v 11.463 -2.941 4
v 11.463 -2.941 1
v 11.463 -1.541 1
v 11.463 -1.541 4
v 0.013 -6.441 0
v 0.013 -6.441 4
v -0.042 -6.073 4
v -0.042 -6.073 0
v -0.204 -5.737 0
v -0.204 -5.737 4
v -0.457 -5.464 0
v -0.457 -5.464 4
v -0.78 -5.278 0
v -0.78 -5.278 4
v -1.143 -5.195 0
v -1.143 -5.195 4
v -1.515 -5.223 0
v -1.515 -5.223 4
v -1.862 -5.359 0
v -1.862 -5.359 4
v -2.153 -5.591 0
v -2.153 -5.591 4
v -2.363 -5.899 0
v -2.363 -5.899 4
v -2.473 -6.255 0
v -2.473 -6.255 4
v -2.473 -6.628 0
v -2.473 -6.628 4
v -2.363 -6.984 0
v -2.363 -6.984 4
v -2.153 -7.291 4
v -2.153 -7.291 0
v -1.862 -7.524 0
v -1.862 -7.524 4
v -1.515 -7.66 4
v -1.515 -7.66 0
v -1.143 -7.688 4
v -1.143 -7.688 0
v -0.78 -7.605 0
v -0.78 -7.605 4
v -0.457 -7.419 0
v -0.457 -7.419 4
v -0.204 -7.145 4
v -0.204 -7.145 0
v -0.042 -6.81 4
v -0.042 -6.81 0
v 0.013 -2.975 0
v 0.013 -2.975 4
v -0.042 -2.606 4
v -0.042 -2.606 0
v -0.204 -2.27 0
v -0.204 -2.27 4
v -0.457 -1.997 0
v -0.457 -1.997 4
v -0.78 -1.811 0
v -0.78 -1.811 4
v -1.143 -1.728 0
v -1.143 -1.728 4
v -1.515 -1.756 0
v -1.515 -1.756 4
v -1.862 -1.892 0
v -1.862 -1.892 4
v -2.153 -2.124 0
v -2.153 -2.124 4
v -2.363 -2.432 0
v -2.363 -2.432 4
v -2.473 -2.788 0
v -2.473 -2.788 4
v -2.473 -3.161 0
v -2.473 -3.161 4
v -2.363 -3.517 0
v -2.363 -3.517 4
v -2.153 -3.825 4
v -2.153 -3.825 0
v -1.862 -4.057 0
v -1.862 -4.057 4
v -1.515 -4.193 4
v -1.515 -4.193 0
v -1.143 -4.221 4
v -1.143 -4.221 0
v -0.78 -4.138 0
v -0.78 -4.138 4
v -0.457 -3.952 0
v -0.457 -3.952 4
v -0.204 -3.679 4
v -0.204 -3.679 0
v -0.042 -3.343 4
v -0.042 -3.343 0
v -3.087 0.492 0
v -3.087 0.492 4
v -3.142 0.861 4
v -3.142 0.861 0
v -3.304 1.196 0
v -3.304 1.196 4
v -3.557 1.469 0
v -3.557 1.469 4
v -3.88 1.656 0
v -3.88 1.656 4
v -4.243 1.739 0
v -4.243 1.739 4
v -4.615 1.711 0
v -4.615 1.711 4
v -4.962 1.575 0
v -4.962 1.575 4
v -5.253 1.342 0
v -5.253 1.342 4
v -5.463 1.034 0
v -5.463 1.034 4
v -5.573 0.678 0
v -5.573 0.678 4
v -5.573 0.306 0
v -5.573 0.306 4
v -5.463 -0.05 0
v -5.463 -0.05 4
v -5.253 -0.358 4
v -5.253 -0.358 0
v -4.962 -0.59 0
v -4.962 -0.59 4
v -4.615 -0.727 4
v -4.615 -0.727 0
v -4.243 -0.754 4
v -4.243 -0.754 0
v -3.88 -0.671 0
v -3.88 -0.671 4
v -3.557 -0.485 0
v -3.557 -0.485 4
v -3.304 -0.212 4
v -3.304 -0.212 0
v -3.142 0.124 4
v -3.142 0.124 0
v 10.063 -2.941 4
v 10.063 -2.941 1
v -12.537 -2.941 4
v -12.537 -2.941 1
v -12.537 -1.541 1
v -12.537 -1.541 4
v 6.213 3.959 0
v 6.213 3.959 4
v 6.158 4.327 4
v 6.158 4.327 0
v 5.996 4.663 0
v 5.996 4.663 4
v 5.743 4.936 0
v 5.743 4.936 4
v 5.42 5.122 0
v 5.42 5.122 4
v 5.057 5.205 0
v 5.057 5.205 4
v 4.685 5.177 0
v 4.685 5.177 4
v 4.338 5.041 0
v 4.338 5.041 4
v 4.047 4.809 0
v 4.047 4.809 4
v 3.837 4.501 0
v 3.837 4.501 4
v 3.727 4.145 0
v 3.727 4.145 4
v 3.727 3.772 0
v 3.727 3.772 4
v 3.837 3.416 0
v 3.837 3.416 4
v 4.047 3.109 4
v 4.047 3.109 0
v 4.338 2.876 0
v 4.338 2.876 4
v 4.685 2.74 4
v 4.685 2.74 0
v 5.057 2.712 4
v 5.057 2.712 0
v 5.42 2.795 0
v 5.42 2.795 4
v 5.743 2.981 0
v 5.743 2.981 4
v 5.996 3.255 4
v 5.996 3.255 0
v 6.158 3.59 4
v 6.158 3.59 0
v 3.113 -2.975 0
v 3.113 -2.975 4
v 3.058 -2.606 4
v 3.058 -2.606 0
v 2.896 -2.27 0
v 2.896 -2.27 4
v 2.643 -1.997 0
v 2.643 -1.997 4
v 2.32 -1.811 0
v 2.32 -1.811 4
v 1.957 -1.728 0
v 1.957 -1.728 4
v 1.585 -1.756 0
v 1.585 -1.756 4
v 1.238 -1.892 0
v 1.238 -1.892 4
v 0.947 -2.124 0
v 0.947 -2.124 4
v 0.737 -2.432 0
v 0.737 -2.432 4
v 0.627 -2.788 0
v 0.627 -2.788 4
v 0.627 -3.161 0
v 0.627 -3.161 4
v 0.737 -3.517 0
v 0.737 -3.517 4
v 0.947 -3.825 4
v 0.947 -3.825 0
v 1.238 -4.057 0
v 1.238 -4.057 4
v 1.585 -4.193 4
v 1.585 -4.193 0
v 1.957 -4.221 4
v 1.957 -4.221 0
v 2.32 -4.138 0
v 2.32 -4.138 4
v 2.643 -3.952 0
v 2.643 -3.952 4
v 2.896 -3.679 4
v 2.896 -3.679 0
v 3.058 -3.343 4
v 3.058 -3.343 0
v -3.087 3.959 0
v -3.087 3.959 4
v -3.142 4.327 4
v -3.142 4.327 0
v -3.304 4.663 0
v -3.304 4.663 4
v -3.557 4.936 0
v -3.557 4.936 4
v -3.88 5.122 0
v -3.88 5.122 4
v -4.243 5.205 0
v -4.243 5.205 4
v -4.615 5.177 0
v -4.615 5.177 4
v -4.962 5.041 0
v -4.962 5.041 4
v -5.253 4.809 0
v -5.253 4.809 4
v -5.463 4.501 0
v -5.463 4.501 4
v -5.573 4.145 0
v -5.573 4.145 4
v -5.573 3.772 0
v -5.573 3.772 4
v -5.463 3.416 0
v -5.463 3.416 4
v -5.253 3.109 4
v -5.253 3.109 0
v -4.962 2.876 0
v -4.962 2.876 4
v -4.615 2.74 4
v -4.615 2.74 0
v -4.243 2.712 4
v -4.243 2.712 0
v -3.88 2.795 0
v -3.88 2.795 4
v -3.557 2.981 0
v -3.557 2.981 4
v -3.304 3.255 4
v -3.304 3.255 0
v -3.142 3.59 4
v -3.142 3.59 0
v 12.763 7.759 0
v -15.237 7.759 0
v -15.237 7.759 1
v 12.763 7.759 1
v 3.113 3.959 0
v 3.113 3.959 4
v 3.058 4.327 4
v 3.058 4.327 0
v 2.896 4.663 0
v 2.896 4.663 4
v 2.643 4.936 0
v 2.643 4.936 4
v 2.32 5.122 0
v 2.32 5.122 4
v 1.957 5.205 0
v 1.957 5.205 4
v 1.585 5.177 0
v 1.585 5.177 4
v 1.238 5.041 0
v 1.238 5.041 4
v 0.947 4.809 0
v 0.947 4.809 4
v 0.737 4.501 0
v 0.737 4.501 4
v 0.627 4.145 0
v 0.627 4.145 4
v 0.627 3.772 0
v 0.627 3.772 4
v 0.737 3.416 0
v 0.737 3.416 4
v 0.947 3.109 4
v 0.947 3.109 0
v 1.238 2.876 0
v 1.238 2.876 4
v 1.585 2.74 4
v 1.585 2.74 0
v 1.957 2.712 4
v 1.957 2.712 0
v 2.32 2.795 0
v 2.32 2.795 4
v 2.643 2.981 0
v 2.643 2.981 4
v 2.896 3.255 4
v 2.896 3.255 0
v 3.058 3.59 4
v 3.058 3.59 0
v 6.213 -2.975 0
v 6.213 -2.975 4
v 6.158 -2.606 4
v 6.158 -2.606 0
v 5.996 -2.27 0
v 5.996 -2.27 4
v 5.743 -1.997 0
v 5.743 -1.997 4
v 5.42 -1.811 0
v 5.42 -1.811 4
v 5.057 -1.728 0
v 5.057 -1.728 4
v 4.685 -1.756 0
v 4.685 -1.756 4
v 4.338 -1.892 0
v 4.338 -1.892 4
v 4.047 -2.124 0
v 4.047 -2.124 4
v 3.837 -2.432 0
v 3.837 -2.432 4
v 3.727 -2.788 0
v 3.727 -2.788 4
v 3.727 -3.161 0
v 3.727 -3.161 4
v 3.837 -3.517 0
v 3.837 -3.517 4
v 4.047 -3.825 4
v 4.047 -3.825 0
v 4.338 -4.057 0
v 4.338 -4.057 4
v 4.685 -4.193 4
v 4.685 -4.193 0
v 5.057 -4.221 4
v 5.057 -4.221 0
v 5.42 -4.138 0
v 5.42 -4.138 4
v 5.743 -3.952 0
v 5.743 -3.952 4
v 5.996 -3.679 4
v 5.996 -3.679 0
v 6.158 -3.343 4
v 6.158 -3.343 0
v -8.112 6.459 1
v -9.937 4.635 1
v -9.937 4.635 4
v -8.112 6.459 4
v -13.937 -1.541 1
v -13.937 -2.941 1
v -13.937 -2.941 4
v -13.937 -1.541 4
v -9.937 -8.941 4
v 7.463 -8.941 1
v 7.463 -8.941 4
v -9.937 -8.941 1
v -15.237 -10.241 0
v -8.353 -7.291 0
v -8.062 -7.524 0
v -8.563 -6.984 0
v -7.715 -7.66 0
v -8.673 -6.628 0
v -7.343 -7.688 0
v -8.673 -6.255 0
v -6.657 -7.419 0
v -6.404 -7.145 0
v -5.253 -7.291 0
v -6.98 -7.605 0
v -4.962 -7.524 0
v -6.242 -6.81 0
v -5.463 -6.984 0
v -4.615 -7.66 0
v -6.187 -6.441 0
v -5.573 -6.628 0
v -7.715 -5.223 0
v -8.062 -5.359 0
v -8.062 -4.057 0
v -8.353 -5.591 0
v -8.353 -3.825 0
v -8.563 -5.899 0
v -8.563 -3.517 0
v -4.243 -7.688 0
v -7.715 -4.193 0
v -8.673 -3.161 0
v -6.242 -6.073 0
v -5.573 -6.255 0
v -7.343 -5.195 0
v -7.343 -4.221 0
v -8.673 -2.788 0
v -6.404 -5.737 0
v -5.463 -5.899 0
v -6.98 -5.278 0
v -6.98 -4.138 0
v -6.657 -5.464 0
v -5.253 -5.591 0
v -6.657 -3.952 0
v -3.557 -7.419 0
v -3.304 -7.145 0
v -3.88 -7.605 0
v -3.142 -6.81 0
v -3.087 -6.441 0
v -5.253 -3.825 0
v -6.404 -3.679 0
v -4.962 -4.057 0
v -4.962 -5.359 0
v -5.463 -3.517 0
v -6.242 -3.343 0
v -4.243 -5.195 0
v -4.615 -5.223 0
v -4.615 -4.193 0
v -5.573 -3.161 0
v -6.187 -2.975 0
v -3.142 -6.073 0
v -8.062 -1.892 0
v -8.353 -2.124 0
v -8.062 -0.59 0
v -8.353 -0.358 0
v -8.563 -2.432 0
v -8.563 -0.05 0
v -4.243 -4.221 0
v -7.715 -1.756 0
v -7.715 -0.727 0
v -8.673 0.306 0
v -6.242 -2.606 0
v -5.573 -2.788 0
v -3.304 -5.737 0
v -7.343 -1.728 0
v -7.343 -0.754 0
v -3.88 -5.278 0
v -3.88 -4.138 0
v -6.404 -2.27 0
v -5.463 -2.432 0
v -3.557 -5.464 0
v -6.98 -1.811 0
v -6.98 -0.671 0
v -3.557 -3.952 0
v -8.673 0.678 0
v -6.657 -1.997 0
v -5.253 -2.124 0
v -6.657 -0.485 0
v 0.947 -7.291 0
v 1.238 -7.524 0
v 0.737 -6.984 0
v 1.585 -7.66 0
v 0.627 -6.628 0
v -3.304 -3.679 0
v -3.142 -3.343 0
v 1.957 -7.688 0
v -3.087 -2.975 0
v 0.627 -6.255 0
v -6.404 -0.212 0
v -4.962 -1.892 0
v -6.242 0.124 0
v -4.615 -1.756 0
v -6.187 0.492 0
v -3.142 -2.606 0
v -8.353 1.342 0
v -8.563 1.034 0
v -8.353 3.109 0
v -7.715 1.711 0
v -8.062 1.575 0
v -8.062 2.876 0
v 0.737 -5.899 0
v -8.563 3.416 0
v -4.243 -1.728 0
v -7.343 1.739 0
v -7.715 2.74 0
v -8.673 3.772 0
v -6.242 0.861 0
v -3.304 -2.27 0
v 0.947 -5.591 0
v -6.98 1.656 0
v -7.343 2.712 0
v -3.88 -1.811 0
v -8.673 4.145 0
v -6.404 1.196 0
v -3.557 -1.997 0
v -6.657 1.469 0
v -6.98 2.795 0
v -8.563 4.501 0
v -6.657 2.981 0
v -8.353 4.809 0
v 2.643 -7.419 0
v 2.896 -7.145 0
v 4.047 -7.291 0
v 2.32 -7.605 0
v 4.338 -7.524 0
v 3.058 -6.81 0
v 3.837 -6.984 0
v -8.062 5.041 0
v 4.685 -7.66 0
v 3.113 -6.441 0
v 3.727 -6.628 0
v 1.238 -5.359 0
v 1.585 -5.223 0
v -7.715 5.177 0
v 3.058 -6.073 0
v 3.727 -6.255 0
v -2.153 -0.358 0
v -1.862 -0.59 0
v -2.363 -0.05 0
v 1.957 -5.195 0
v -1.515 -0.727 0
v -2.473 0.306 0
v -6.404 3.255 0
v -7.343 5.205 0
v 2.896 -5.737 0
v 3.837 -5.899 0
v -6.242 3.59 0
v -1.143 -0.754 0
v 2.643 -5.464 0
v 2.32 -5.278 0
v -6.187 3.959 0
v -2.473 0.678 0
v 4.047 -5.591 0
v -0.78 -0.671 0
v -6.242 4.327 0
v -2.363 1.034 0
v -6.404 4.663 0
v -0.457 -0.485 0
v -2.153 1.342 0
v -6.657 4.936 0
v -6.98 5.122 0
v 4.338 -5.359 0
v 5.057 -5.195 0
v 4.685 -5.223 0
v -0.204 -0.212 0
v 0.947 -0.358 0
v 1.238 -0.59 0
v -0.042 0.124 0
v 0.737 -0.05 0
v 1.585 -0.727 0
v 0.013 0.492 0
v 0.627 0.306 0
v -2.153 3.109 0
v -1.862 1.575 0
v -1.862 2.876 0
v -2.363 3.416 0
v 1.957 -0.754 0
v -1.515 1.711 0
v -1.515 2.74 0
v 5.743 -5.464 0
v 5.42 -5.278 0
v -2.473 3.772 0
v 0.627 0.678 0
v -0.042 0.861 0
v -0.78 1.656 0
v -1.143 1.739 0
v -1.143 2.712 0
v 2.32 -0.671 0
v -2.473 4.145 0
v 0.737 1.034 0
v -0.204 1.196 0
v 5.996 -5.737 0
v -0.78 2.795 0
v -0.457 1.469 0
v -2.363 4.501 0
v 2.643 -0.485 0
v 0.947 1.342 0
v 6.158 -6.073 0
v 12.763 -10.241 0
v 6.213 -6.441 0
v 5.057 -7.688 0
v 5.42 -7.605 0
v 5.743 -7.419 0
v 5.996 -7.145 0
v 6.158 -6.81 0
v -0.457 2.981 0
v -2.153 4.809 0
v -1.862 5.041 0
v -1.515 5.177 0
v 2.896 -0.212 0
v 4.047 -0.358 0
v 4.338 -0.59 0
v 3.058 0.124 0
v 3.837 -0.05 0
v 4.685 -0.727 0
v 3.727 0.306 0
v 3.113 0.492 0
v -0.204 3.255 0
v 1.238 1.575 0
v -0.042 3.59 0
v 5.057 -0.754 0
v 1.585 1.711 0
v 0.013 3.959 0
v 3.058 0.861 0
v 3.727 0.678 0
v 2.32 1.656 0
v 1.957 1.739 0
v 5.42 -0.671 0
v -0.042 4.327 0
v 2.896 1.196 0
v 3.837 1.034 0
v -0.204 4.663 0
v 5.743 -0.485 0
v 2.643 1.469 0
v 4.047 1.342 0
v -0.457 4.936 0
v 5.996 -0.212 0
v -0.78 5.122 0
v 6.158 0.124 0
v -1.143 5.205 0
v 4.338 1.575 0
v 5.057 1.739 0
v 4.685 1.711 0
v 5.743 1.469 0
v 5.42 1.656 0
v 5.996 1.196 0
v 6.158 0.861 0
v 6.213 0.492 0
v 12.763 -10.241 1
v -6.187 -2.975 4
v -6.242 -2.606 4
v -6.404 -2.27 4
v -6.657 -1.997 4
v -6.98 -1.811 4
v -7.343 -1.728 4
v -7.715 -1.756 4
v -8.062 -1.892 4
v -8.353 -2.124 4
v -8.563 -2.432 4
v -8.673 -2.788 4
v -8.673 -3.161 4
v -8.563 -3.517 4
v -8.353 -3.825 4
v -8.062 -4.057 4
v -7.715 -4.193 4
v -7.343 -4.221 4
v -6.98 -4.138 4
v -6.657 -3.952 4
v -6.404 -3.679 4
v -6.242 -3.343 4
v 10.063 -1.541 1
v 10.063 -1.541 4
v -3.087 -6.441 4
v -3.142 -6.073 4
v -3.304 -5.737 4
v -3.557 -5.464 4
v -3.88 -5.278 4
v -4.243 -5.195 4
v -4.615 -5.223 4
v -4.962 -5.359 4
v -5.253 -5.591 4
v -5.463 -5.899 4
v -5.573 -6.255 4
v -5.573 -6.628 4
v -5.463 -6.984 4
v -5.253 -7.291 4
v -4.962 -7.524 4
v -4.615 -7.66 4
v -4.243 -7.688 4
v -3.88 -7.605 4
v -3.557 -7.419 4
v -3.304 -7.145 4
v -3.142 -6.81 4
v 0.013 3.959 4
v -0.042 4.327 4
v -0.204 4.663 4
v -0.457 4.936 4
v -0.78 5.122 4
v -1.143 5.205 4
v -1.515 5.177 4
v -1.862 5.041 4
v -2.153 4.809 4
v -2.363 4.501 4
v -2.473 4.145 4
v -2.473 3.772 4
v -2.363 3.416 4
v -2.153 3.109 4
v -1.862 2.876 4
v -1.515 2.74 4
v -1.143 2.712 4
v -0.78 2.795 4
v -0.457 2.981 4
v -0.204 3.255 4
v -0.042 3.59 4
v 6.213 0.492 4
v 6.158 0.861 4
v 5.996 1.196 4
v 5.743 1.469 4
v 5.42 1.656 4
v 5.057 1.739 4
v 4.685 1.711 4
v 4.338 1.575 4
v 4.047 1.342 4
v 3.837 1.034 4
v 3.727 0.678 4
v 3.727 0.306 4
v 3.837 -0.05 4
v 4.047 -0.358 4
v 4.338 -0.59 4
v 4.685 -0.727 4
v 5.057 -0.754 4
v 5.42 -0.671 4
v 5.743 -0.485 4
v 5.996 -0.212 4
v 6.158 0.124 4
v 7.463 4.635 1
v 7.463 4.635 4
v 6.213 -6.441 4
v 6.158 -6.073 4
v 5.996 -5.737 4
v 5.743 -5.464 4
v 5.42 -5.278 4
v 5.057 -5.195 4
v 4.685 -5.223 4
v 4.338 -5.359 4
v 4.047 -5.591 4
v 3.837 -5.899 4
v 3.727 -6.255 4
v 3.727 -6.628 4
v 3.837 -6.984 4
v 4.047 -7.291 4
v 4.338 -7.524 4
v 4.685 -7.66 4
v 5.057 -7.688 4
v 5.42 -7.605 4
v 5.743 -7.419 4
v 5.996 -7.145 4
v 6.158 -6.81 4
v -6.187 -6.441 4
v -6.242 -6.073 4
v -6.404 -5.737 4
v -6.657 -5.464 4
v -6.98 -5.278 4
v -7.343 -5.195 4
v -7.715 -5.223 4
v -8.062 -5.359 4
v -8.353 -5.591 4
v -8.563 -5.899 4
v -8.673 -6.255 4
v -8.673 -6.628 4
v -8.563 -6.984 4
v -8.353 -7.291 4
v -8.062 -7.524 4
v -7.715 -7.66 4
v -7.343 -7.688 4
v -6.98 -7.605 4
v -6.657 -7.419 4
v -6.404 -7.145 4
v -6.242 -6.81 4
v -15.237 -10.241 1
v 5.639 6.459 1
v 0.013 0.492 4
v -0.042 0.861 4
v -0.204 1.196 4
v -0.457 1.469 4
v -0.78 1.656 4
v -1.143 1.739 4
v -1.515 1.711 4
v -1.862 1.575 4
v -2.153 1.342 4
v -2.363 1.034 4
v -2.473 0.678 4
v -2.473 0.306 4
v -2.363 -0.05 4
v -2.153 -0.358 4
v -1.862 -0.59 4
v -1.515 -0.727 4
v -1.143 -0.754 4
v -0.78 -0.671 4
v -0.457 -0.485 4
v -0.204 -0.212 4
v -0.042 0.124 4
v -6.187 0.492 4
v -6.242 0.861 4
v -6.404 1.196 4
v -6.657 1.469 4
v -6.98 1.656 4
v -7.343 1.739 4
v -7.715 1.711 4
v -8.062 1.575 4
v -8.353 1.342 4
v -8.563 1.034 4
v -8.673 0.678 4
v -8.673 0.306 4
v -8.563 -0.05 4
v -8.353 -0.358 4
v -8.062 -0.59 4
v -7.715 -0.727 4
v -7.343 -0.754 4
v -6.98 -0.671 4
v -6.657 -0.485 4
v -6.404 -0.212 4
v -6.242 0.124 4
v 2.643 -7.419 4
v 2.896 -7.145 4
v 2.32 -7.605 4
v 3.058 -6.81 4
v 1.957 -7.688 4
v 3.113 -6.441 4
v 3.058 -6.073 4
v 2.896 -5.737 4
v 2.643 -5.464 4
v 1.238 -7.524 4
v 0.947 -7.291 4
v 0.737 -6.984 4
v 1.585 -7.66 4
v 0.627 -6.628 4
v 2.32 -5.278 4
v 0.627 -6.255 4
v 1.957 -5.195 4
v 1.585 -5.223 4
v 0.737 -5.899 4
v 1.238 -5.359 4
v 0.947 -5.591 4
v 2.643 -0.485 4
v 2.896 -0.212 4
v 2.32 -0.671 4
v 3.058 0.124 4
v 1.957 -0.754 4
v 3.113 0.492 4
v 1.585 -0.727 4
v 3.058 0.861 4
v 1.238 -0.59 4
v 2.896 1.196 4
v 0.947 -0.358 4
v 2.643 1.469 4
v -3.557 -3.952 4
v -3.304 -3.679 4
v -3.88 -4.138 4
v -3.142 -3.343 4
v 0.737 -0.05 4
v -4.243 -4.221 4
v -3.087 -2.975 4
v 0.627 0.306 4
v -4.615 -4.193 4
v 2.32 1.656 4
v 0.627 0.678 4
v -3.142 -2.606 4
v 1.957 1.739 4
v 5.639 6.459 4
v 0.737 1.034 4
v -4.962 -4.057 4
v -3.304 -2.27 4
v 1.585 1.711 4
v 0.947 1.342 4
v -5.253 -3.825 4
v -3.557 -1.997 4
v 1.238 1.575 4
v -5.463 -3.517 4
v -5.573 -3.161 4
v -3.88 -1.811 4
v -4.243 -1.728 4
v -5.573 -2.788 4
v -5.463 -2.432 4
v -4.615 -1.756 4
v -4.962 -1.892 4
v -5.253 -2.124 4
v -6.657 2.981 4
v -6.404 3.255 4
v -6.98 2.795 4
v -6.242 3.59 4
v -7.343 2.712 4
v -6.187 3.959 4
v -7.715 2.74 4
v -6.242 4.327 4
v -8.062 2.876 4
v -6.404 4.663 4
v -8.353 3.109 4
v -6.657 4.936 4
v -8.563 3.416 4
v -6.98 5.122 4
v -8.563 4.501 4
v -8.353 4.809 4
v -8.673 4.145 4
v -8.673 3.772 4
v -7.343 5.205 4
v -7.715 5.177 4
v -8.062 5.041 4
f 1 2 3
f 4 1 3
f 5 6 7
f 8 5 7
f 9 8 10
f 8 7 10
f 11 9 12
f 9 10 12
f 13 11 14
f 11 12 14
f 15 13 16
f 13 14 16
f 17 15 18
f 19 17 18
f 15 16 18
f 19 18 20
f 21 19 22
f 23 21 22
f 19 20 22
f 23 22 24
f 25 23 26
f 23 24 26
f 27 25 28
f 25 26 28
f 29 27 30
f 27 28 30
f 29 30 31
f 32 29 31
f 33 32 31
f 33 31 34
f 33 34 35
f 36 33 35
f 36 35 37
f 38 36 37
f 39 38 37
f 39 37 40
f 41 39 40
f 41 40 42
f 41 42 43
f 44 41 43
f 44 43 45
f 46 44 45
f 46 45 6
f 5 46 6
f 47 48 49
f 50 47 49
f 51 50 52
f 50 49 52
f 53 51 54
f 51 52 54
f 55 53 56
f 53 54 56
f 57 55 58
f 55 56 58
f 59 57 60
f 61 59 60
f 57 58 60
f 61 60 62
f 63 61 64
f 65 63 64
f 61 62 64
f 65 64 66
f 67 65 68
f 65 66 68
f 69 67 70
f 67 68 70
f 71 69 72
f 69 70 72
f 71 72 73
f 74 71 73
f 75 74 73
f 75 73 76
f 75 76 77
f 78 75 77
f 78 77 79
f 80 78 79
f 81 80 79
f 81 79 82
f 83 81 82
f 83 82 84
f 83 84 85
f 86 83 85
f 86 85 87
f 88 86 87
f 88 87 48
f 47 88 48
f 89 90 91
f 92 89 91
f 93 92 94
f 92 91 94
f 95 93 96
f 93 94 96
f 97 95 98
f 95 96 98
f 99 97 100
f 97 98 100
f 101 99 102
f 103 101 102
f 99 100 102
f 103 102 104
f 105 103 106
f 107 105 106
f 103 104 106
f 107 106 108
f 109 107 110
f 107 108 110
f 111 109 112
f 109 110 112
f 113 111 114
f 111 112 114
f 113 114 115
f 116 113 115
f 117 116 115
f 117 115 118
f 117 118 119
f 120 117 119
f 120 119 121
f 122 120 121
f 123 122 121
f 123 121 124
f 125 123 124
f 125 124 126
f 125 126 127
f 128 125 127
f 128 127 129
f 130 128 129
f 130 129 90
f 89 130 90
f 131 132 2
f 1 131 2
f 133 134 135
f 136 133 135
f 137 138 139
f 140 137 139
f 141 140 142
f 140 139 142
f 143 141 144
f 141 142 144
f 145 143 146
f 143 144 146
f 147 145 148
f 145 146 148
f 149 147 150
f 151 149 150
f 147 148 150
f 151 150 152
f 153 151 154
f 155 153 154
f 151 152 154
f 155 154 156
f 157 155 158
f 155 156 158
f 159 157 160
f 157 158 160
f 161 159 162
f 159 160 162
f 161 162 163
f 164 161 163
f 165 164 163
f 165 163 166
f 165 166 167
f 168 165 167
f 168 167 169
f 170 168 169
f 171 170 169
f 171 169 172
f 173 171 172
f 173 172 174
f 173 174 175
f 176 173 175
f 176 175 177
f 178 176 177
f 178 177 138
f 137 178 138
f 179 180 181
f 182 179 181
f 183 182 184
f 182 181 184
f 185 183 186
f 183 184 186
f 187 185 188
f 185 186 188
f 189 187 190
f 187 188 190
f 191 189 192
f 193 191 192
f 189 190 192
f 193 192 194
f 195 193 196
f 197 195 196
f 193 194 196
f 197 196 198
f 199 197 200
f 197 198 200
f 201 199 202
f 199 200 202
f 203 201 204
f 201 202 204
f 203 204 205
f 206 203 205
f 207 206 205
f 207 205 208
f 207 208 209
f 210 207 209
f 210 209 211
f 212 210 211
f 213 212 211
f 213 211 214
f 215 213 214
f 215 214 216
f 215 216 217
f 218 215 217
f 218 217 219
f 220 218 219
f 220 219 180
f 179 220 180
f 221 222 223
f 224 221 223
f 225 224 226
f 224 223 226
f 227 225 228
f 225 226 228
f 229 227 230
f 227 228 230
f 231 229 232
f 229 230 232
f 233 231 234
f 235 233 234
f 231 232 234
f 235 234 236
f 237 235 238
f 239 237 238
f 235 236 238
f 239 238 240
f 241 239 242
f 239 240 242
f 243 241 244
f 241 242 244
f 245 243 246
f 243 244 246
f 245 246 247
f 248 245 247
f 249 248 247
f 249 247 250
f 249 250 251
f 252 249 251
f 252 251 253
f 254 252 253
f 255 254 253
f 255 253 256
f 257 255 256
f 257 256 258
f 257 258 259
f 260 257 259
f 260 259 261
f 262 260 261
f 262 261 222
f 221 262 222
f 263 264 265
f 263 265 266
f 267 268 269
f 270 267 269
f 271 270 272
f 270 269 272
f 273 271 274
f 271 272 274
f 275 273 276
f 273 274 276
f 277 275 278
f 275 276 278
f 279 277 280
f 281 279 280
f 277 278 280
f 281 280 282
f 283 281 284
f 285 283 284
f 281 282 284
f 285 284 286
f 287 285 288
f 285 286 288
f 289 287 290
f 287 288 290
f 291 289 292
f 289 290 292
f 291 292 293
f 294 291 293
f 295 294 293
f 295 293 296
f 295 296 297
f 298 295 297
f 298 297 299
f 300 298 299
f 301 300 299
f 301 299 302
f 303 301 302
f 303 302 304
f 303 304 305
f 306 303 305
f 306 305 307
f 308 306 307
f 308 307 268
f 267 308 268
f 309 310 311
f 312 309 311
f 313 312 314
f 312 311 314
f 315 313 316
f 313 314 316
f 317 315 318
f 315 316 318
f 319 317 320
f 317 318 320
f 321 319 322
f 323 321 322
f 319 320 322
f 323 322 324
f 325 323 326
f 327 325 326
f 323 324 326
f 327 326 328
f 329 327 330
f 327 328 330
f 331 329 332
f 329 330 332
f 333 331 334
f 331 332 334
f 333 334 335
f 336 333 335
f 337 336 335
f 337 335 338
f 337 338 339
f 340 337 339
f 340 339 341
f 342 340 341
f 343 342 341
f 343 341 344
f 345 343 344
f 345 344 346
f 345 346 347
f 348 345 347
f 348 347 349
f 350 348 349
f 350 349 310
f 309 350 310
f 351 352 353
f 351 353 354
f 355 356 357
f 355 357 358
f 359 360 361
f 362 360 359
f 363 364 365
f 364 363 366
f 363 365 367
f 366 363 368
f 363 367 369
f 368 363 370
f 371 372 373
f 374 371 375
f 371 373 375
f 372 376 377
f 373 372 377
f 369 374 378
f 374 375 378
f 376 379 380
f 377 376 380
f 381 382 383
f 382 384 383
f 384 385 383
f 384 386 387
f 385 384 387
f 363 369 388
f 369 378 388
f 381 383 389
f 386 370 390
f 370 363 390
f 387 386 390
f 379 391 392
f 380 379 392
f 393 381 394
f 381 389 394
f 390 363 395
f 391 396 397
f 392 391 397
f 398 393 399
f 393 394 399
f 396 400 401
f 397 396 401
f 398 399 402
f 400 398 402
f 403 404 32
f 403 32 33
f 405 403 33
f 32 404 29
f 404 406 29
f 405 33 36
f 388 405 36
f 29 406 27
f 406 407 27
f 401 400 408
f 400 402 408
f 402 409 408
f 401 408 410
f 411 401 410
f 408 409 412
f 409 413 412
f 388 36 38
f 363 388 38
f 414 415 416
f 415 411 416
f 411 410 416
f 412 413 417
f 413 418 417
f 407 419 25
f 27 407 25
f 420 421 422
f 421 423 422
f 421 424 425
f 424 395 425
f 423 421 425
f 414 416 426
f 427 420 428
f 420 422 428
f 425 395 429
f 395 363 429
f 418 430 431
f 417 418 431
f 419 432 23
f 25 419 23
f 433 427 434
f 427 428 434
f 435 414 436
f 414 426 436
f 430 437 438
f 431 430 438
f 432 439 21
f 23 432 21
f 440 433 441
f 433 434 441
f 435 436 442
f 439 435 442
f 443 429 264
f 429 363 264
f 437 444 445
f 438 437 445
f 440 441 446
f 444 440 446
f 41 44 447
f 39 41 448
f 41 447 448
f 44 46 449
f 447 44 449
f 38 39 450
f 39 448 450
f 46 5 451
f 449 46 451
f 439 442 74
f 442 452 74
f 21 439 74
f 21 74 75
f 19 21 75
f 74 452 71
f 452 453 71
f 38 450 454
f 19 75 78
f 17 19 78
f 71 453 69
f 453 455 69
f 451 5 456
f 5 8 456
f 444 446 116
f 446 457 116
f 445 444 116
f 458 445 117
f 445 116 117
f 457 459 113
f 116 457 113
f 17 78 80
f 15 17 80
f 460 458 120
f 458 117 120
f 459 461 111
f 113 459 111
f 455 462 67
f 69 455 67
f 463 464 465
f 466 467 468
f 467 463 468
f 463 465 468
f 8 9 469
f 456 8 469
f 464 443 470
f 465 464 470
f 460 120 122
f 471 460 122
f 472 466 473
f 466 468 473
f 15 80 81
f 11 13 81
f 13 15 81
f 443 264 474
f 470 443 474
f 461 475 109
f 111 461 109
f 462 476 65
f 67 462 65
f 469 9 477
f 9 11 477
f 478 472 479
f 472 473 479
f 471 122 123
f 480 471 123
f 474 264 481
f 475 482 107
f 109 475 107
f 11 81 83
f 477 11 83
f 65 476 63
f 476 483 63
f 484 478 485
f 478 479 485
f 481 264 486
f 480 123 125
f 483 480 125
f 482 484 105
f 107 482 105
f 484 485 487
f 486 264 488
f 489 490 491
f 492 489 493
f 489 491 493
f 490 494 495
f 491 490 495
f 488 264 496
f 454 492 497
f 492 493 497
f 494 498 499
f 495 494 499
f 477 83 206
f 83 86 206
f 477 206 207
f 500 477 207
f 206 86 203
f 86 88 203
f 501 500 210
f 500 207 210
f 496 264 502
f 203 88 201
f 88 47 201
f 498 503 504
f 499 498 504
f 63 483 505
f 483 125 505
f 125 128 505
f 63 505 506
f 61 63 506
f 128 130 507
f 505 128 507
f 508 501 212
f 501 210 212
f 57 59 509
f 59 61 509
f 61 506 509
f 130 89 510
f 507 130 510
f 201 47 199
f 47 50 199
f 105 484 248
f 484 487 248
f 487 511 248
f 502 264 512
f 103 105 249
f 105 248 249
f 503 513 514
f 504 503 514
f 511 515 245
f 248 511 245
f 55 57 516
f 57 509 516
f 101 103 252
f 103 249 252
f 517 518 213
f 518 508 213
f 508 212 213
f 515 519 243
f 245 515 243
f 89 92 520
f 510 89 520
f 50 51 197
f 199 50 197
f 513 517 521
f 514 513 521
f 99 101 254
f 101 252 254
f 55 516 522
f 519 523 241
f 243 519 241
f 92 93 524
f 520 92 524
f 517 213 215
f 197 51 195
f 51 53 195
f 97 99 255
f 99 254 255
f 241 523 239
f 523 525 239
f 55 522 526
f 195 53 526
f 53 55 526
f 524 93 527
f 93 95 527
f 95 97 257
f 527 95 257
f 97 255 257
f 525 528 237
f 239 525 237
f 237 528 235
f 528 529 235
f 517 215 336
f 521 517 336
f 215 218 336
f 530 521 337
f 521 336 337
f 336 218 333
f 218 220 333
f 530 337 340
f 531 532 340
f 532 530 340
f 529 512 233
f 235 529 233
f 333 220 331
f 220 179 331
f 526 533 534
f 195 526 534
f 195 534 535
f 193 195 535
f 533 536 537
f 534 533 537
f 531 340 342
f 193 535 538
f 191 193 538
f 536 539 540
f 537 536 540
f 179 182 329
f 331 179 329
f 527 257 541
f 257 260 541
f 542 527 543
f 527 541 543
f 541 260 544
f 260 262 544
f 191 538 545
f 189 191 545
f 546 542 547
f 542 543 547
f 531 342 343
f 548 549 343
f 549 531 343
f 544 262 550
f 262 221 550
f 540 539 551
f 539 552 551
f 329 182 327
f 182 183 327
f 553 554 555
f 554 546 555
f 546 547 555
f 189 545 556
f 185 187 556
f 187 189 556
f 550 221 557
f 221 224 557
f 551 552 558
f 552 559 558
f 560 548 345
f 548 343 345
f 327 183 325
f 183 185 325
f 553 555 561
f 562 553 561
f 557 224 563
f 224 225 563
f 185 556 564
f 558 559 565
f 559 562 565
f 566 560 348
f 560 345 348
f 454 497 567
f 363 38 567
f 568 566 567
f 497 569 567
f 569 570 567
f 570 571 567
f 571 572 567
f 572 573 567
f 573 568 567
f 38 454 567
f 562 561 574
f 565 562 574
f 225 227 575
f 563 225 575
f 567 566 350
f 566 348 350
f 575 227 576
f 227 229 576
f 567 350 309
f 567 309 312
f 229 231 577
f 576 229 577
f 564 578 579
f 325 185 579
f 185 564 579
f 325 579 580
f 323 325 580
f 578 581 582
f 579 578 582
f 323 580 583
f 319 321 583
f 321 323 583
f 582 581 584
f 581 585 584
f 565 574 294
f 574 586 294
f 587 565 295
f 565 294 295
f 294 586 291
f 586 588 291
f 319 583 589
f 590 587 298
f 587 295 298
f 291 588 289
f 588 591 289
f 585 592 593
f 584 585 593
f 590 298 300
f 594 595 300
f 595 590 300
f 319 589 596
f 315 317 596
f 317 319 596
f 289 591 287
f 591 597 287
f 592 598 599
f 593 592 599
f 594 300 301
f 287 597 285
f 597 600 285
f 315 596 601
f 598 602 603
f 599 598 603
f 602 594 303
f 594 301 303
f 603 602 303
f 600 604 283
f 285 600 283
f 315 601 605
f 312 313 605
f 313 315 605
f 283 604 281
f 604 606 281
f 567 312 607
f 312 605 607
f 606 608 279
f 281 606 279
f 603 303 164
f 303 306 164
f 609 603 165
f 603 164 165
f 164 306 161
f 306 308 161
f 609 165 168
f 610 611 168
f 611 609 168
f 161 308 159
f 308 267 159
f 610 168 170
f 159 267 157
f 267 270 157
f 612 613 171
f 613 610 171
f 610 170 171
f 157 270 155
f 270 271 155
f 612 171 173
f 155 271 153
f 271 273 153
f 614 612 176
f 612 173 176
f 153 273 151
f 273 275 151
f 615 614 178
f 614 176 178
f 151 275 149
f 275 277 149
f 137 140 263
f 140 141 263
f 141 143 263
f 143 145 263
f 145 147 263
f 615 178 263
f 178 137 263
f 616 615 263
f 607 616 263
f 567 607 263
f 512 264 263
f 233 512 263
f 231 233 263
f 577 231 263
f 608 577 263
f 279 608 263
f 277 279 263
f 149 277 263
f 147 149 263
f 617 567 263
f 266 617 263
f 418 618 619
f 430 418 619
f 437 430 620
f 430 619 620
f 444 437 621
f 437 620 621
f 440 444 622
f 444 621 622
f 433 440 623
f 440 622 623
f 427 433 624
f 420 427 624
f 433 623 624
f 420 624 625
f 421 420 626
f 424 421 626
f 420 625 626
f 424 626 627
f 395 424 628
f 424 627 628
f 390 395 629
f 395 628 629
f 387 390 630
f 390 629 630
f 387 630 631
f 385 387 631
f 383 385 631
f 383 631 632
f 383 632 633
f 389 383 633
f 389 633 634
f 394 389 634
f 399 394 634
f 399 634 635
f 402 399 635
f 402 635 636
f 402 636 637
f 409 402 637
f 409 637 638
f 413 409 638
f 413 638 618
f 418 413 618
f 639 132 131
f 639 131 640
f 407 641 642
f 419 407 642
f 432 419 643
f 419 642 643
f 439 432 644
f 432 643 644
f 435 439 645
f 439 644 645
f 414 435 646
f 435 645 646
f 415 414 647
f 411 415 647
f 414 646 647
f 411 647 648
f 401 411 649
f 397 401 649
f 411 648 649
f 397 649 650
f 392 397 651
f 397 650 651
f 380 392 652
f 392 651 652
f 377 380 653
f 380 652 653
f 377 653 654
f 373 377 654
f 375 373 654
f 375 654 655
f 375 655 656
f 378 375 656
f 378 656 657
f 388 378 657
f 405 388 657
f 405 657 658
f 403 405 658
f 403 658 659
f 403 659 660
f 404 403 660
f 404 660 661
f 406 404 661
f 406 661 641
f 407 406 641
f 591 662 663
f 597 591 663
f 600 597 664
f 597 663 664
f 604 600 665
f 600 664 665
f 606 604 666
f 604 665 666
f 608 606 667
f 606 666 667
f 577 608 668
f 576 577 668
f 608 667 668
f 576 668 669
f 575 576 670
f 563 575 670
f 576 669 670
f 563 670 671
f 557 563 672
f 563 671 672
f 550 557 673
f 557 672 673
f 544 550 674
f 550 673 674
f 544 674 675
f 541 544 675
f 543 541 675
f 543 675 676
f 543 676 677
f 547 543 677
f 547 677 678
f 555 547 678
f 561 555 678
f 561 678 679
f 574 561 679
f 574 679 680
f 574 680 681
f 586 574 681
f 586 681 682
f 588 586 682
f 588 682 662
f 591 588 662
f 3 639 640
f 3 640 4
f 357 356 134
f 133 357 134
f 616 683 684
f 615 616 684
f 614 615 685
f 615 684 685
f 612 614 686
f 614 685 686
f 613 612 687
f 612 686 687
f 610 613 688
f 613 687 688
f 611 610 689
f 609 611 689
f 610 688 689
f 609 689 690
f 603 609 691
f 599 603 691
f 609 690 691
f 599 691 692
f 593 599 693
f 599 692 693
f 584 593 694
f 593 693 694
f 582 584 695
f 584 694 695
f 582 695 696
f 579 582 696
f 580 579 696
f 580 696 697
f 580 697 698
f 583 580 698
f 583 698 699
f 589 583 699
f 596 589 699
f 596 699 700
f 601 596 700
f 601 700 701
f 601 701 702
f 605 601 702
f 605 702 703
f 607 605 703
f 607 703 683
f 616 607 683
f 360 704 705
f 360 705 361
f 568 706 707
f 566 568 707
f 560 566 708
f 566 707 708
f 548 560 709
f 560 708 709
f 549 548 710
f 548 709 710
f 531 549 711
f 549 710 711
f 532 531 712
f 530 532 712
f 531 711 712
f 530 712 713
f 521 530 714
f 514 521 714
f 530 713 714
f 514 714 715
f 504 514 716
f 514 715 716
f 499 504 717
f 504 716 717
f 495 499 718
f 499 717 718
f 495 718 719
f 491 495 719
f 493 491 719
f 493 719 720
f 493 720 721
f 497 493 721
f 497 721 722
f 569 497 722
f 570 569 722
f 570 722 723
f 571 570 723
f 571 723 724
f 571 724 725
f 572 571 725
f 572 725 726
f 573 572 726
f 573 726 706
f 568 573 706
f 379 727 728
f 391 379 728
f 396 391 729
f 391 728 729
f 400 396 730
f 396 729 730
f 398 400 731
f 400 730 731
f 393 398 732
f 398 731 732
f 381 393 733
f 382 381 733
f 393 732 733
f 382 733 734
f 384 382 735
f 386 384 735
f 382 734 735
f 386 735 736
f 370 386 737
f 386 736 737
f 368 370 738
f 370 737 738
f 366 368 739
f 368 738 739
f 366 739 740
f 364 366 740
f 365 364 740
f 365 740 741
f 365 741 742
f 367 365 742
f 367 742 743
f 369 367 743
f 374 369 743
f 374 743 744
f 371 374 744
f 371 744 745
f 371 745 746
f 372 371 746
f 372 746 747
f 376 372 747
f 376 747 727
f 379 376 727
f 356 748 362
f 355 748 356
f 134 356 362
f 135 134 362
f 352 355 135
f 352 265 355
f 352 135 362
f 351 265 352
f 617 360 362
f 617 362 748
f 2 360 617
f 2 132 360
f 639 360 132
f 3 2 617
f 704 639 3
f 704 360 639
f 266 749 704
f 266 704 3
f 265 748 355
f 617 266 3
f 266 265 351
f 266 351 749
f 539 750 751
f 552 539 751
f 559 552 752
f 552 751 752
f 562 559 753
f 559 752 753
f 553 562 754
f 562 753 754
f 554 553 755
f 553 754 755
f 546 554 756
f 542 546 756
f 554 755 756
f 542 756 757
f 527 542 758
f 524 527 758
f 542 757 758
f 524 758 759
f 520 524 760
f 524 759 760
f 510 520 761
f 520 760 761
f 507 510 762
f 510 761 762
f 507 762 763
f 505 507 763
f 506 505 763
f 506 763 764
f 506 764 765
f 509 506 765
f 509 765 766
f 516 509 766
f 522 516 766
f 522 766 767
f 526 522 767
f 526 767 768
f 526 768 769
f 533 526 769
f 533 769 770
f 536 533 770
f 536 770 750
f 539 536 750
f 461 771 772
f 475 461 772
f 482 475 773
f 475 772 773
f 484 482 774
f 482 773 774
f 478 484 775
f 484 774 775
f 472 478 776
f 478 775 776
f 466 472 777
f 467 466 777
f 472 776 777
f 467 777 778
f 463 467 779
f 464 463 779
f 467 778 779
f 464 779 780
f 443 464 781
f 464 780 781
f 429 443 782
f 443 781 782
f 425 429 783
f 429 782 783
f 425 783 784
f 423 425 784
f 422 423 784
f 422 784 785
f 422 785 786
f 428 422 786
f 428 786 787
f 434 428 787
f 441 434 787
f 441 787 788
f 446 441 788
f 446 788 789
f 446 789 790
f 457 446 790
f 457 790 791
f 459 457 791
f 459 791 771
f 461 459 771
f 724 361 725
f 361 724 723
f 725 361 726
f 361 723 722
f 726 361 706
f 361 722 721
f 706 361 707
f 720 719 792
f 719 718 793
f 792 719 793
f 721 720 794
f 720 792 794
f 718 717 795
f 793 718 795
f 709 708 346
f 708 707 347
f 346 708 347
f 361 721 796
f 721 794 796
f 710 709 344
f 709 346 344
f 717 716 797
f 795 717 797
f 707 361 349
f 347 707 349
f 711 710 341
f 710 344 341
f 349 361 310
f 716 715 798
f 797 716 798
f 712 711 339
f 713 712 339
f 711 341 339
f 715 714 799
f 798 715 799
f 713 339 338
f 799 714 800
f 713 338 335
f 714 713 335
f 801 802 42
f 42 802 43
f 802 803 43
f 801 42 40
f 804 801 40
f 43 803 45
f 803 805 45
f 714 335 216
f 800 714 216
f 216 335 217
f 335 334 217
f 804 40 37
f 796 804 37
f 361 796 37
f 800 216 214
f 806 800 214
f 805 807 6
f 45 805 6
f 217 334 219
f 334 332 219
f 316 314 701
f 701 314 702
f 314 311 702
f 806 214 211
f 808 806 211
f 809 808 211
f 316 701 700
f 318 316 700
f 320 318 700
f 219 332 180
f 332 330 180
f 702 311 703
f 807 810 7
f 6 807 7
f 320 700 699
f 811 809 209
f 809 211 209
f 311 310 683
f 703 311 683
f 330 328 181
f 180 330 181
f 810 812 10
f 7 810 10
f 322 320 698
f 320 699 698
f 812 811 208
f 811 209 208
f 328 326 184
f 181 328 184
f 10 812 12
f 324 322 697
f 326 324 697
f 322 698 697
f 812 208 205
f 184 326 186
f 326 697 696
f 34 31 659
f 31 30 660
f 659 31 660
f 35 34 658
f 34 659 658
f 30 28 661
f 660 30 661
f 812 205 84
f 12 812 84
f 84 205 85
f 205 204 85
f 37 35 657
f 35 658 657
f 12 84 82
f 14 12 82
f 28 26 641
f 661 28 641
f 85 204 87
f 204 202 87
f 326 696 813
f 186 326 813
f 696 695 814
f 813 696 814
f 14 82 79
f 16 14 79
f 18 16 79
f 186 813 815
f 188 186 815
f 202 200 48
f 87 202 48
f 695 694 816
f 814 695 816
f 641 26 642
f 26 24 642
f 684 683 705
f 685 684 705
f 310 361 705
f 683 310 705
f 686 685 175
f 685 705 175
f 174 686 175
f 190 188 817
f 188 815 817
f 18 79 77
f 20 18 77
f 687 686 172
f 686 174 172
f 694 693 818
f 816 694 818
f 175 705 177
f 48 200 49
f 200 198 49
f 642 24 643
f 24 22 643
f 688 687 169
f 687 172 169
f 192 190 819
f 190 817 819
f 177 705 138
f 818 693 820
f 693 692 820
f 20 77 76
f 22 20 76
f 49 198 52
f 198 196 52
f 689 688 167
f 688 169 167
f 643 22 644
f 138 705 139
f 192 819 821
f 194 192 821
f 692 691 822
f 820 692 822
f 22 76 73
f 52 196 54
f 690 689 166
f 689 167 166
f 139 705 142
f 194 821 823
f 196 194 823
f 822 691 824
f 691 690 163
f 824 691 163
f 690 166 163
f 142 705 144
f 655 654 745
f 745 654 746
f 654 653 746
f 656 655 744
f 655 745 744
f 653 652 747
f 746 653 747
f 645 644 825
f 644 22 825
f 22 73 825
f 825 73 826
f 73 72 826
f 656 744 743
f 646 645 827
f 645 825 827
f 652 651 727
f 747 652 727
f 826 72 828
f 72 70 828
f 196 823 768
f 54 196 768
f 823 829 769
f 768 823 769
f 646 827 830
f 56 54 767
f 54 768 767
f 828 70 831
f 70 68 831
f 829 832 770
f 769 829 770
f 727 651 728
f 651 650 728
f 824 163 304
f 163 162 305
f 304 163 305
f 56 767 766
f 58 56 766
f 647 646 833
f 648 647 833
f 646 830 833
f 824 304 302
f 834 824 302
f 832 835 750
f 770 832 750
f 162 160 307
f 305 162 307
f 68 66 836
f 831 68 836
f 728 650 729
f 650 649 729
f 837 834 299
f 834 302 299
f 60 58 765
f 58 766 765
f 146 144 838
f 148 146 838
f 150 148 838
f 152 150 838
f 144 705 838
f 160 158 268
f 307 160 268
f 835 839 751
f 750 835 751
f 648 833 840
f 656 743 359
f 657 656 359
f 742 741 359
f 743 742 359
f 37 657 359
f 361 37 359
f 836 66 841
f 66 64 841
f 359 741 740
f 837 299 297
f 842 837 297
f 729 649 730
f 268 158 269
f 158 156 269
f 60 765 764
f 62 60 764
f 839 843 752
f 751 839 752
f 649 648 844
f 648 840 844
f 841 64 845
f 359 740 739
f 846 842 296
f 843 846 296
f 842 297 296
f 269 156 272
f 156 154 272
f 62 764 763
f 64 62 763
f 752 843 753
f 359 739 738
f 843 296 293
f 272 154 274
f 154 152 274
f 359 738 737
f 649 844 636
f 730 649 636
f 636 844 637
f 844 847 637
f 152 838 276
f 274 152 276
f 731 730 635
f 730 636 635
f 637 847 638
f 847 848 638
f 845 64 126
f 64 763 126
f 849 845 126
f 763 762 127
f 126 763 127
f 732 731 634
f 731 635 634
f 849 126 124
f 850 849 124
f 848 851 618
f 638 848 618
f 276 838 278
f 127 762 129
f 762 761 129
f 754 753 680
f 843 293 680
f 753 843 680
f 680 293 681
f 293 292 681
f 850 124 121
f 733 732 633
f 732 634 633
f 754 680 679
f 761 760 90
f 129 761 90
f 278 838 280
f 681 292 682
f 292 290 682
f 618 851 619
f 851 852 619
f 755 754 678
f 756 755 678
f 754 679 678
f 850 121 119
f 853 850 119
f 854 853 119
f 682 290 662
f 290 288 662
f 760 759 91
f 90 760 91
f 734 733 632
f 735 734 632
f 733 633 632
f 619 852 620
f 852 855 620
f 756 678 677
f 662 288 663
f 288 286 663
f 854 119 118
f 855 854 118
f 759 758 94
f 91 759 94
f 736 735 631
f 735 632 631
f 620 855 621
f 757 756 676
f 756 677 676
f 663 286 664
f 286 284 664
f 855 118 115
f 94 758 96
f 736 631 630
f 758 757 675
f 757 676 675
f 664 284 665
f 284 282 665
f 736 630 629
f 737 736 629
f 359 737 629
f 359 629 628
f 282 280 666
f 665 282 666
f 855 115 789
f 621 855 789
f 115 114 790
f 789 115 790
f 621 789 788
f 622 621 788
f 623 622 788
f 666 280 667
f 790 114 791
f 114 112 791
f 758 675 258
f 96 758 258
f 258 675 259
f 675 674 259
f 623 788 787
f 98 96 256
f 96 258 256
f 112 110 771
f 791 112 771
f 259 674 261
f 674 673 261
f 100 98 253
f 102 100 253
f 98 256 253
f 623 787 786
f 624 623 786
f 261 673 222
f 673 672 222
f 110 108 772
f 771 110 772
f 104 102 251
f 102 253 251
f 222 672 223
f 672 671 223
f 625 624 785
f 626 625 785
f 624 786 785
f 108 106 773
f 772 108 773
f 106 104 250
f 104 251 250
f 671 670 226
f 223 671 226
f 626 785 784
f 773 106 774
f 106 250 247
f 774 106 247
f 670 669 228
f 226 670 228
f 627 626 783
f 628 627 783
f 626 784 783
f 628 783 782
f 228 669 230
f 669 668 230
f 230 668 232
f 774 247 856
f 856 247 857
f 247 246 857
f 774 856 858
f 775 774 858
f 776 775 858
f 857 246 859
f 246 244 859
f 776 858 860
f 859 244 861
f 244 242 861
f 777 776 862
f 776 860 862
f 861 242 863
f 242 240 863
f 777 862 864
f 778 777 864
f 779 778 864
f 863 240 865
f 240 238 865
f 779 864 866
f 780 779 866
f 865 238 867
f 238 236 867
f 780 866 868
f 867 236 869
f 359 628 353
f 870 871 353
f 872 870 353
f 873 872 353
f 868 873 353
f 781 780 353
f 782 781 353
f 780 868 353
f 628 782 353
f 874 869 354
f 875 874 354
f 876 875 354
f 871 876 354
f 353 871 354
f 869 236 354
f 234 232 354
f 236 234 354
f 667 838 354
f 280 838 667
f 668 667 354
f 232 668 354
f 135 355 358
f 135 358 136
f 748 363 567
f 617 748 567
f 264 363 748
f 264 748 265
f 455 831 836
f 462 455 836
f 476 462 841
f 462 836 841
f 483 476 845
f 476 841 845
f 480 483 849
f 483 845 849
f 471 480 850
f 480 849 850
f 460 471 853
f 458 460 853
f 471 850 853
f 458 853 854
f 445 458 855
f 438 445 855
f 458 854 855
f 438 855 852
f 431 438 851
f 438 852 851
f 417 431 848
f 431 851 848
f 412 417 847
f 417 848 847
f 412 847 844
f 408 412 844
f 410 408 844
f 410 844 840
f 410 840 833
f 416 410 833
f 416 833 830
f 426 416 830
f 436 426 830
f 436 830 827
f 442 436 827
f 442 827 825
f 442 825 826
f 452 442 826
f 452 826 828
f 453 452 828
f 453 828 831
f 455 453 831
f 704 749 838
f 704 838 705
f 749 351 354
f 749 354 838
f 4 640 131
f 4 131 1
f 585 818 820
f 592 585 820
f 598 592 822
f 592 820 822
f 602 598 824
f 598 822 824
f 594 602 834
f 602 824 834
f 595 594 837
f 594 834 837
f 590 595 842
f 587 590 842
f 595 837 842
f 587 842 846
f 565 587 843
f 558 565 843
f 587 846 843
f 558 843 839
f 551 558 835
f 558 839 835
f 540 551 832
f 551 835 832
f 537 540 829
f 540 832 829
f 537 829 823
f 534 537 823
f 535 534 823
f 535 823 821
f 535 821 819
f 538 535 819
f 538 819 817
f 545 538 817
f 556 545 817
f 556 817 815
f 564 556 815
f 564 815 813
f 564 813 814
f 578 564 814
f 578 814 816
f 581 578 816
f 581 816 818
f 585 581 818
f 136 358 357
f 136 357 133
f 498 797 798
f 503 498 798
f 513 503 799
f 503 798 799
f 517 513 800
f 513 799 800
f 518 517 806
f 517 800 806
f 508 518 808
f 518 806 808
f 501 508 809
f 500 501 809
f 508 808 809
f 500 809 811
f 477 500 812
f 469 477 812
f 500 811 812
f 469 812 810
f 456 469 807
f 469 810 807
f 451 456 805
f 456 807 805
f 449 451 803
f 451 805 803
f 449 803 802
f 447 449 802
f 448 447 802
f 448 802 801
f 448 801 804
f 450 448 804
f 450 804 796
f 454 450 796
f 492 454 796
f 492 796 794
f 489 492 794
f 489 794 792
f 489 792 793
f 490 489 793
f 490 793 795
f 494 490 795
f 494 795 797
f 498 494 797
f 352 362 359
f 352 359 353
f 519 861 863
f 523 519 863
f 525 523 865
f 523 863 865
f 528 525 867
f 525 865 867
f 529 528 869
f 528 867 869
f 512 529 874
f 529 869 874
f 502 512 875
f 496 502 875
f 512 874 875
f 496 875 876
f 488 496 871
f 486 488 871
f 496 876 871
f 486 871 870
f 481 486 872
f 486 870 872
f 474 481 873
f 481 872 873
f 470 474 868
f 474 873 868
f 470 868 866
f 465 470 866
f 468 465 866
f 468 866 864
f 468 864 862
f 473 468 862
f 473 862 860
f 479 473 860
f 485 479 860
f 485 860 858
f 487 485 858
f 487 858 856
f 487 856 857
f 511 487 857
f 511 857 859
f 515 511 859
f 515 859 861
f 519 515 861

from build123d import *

# Parameters (mm, degrees)
SKETCH1_W           = 28
SKETCH1_H           = 18
BOSS_EXTRUDE1_DEPTH = 1
SKETCH2_W           = 1.4
SKETCH2_H           = 1.4
BOSS_EXTRUDE3_DEPTH = 3
SKETCH3_R           = 1.25
CUT_EXTRUDE1_DEPTH  = 10


with BuildPart() as part:
    # Sketch1 → Boss-Extrude1 (new body)
    with BuildSketch(Plane.XY):
        with Locations((-1.236641221, -1.241221374)):
            Rectangle(SKETCH1_W, SKETCH1_H)
    extrude(amount=BOSS_EXTRUDE1_DEPTH)

    # Sketch2 → Boss-Extrude3 (add)
    with BuildSketch(Plane.XY.offset(1)):
        with Locations((10.763358779, -2.241221374)):
            Rectangle(SKETCH2_W, SKETCH2_H)
        with Locations((-13.236641221, -2.241221374)):
            Rectangle(SKETCH2_W, SKETCH2_H)
        Polygon((-8.112377153, 6.458778626), (5.63909471, 6.458778626), (7.463358779, 4.634514557), (7.463358779, -8.941221374), (-9.936641221, -8.941221374), (-9.936641221, 4.634514557), align=None)
    extrude(amount=BOSS_EXTRUDE3_DEPTH)

    # Sketch3 → Cut-Extrude1 (cut)
    with BuildSketch(Plane.XY.offset(4)):
        with Locations((-7.436641221, 3.958778626)):
            Circle(SKETCH3_R)
        with Locations((-4.336641221, 3.958778626)):
            Circle(SKETCH3_R)
        with Locations((-1.236641221, 3.958778626)):
            Circle(SKETCH3_R)
        with Locations((1.863358779, 3.958778626)):
            Circle(SKETCH3_R)
        with Locations((4.963358779, 3.958778626)):
            Circle(SKETCH3_R)
        with Locations((-4.336641221, 0.492111959)):
            Circle(SKETCH3_R)
        with Locations((-1.236641221, 0.492111959)):
            Circle(SKETCH3_R)
        with Locations((1.863358779, 0.492111959)):
            Circle(SKETCH3_R)
        with Locations((4.963358779, 0.492111959)):
            Circle(SKETCH3_R)
        with Locations((-4.336641221, -2.974554707)):
            Circle(SKETCH3_R)
        with Locations((-1.236641221, -2.974554707)):
            Circle(SKETCH3_R)
        with Locations((1.863358779, -2.974554707)):
            Circle(SKETCH3_R)
        with Locations((4.963358779, -2.974554707)):
            Circle(SKETCH3_R)
        with Locations((-4.336641221, -6.441221374)):
            Circle(SKETCH3_R)
        with Locations((-1.236641221, -6.441221374)):
            Circle(SKETCH3_R)
        with Locations((1.863358779, -6.441221374)):
            Circle(SKETCH3_R)
        with Locations((4.963358779, -6.441221374)):
            Circle(SKETCH3_R)
        with Locations((-7.436641221, 0.492111959)):
            Circle(SKETCH3_R)
        with Locations((-7.436641221, -2.974554707)):
            Circle(SKETCH3_R)
        with Locations((-7.436641221, -6.441221374)):
            Circle(SKETCH3_R)
    extrude(amount=-CUT_EXTRUDE1_DEPTH, mode=Mode.SUBTRACT)


solid = part.part
